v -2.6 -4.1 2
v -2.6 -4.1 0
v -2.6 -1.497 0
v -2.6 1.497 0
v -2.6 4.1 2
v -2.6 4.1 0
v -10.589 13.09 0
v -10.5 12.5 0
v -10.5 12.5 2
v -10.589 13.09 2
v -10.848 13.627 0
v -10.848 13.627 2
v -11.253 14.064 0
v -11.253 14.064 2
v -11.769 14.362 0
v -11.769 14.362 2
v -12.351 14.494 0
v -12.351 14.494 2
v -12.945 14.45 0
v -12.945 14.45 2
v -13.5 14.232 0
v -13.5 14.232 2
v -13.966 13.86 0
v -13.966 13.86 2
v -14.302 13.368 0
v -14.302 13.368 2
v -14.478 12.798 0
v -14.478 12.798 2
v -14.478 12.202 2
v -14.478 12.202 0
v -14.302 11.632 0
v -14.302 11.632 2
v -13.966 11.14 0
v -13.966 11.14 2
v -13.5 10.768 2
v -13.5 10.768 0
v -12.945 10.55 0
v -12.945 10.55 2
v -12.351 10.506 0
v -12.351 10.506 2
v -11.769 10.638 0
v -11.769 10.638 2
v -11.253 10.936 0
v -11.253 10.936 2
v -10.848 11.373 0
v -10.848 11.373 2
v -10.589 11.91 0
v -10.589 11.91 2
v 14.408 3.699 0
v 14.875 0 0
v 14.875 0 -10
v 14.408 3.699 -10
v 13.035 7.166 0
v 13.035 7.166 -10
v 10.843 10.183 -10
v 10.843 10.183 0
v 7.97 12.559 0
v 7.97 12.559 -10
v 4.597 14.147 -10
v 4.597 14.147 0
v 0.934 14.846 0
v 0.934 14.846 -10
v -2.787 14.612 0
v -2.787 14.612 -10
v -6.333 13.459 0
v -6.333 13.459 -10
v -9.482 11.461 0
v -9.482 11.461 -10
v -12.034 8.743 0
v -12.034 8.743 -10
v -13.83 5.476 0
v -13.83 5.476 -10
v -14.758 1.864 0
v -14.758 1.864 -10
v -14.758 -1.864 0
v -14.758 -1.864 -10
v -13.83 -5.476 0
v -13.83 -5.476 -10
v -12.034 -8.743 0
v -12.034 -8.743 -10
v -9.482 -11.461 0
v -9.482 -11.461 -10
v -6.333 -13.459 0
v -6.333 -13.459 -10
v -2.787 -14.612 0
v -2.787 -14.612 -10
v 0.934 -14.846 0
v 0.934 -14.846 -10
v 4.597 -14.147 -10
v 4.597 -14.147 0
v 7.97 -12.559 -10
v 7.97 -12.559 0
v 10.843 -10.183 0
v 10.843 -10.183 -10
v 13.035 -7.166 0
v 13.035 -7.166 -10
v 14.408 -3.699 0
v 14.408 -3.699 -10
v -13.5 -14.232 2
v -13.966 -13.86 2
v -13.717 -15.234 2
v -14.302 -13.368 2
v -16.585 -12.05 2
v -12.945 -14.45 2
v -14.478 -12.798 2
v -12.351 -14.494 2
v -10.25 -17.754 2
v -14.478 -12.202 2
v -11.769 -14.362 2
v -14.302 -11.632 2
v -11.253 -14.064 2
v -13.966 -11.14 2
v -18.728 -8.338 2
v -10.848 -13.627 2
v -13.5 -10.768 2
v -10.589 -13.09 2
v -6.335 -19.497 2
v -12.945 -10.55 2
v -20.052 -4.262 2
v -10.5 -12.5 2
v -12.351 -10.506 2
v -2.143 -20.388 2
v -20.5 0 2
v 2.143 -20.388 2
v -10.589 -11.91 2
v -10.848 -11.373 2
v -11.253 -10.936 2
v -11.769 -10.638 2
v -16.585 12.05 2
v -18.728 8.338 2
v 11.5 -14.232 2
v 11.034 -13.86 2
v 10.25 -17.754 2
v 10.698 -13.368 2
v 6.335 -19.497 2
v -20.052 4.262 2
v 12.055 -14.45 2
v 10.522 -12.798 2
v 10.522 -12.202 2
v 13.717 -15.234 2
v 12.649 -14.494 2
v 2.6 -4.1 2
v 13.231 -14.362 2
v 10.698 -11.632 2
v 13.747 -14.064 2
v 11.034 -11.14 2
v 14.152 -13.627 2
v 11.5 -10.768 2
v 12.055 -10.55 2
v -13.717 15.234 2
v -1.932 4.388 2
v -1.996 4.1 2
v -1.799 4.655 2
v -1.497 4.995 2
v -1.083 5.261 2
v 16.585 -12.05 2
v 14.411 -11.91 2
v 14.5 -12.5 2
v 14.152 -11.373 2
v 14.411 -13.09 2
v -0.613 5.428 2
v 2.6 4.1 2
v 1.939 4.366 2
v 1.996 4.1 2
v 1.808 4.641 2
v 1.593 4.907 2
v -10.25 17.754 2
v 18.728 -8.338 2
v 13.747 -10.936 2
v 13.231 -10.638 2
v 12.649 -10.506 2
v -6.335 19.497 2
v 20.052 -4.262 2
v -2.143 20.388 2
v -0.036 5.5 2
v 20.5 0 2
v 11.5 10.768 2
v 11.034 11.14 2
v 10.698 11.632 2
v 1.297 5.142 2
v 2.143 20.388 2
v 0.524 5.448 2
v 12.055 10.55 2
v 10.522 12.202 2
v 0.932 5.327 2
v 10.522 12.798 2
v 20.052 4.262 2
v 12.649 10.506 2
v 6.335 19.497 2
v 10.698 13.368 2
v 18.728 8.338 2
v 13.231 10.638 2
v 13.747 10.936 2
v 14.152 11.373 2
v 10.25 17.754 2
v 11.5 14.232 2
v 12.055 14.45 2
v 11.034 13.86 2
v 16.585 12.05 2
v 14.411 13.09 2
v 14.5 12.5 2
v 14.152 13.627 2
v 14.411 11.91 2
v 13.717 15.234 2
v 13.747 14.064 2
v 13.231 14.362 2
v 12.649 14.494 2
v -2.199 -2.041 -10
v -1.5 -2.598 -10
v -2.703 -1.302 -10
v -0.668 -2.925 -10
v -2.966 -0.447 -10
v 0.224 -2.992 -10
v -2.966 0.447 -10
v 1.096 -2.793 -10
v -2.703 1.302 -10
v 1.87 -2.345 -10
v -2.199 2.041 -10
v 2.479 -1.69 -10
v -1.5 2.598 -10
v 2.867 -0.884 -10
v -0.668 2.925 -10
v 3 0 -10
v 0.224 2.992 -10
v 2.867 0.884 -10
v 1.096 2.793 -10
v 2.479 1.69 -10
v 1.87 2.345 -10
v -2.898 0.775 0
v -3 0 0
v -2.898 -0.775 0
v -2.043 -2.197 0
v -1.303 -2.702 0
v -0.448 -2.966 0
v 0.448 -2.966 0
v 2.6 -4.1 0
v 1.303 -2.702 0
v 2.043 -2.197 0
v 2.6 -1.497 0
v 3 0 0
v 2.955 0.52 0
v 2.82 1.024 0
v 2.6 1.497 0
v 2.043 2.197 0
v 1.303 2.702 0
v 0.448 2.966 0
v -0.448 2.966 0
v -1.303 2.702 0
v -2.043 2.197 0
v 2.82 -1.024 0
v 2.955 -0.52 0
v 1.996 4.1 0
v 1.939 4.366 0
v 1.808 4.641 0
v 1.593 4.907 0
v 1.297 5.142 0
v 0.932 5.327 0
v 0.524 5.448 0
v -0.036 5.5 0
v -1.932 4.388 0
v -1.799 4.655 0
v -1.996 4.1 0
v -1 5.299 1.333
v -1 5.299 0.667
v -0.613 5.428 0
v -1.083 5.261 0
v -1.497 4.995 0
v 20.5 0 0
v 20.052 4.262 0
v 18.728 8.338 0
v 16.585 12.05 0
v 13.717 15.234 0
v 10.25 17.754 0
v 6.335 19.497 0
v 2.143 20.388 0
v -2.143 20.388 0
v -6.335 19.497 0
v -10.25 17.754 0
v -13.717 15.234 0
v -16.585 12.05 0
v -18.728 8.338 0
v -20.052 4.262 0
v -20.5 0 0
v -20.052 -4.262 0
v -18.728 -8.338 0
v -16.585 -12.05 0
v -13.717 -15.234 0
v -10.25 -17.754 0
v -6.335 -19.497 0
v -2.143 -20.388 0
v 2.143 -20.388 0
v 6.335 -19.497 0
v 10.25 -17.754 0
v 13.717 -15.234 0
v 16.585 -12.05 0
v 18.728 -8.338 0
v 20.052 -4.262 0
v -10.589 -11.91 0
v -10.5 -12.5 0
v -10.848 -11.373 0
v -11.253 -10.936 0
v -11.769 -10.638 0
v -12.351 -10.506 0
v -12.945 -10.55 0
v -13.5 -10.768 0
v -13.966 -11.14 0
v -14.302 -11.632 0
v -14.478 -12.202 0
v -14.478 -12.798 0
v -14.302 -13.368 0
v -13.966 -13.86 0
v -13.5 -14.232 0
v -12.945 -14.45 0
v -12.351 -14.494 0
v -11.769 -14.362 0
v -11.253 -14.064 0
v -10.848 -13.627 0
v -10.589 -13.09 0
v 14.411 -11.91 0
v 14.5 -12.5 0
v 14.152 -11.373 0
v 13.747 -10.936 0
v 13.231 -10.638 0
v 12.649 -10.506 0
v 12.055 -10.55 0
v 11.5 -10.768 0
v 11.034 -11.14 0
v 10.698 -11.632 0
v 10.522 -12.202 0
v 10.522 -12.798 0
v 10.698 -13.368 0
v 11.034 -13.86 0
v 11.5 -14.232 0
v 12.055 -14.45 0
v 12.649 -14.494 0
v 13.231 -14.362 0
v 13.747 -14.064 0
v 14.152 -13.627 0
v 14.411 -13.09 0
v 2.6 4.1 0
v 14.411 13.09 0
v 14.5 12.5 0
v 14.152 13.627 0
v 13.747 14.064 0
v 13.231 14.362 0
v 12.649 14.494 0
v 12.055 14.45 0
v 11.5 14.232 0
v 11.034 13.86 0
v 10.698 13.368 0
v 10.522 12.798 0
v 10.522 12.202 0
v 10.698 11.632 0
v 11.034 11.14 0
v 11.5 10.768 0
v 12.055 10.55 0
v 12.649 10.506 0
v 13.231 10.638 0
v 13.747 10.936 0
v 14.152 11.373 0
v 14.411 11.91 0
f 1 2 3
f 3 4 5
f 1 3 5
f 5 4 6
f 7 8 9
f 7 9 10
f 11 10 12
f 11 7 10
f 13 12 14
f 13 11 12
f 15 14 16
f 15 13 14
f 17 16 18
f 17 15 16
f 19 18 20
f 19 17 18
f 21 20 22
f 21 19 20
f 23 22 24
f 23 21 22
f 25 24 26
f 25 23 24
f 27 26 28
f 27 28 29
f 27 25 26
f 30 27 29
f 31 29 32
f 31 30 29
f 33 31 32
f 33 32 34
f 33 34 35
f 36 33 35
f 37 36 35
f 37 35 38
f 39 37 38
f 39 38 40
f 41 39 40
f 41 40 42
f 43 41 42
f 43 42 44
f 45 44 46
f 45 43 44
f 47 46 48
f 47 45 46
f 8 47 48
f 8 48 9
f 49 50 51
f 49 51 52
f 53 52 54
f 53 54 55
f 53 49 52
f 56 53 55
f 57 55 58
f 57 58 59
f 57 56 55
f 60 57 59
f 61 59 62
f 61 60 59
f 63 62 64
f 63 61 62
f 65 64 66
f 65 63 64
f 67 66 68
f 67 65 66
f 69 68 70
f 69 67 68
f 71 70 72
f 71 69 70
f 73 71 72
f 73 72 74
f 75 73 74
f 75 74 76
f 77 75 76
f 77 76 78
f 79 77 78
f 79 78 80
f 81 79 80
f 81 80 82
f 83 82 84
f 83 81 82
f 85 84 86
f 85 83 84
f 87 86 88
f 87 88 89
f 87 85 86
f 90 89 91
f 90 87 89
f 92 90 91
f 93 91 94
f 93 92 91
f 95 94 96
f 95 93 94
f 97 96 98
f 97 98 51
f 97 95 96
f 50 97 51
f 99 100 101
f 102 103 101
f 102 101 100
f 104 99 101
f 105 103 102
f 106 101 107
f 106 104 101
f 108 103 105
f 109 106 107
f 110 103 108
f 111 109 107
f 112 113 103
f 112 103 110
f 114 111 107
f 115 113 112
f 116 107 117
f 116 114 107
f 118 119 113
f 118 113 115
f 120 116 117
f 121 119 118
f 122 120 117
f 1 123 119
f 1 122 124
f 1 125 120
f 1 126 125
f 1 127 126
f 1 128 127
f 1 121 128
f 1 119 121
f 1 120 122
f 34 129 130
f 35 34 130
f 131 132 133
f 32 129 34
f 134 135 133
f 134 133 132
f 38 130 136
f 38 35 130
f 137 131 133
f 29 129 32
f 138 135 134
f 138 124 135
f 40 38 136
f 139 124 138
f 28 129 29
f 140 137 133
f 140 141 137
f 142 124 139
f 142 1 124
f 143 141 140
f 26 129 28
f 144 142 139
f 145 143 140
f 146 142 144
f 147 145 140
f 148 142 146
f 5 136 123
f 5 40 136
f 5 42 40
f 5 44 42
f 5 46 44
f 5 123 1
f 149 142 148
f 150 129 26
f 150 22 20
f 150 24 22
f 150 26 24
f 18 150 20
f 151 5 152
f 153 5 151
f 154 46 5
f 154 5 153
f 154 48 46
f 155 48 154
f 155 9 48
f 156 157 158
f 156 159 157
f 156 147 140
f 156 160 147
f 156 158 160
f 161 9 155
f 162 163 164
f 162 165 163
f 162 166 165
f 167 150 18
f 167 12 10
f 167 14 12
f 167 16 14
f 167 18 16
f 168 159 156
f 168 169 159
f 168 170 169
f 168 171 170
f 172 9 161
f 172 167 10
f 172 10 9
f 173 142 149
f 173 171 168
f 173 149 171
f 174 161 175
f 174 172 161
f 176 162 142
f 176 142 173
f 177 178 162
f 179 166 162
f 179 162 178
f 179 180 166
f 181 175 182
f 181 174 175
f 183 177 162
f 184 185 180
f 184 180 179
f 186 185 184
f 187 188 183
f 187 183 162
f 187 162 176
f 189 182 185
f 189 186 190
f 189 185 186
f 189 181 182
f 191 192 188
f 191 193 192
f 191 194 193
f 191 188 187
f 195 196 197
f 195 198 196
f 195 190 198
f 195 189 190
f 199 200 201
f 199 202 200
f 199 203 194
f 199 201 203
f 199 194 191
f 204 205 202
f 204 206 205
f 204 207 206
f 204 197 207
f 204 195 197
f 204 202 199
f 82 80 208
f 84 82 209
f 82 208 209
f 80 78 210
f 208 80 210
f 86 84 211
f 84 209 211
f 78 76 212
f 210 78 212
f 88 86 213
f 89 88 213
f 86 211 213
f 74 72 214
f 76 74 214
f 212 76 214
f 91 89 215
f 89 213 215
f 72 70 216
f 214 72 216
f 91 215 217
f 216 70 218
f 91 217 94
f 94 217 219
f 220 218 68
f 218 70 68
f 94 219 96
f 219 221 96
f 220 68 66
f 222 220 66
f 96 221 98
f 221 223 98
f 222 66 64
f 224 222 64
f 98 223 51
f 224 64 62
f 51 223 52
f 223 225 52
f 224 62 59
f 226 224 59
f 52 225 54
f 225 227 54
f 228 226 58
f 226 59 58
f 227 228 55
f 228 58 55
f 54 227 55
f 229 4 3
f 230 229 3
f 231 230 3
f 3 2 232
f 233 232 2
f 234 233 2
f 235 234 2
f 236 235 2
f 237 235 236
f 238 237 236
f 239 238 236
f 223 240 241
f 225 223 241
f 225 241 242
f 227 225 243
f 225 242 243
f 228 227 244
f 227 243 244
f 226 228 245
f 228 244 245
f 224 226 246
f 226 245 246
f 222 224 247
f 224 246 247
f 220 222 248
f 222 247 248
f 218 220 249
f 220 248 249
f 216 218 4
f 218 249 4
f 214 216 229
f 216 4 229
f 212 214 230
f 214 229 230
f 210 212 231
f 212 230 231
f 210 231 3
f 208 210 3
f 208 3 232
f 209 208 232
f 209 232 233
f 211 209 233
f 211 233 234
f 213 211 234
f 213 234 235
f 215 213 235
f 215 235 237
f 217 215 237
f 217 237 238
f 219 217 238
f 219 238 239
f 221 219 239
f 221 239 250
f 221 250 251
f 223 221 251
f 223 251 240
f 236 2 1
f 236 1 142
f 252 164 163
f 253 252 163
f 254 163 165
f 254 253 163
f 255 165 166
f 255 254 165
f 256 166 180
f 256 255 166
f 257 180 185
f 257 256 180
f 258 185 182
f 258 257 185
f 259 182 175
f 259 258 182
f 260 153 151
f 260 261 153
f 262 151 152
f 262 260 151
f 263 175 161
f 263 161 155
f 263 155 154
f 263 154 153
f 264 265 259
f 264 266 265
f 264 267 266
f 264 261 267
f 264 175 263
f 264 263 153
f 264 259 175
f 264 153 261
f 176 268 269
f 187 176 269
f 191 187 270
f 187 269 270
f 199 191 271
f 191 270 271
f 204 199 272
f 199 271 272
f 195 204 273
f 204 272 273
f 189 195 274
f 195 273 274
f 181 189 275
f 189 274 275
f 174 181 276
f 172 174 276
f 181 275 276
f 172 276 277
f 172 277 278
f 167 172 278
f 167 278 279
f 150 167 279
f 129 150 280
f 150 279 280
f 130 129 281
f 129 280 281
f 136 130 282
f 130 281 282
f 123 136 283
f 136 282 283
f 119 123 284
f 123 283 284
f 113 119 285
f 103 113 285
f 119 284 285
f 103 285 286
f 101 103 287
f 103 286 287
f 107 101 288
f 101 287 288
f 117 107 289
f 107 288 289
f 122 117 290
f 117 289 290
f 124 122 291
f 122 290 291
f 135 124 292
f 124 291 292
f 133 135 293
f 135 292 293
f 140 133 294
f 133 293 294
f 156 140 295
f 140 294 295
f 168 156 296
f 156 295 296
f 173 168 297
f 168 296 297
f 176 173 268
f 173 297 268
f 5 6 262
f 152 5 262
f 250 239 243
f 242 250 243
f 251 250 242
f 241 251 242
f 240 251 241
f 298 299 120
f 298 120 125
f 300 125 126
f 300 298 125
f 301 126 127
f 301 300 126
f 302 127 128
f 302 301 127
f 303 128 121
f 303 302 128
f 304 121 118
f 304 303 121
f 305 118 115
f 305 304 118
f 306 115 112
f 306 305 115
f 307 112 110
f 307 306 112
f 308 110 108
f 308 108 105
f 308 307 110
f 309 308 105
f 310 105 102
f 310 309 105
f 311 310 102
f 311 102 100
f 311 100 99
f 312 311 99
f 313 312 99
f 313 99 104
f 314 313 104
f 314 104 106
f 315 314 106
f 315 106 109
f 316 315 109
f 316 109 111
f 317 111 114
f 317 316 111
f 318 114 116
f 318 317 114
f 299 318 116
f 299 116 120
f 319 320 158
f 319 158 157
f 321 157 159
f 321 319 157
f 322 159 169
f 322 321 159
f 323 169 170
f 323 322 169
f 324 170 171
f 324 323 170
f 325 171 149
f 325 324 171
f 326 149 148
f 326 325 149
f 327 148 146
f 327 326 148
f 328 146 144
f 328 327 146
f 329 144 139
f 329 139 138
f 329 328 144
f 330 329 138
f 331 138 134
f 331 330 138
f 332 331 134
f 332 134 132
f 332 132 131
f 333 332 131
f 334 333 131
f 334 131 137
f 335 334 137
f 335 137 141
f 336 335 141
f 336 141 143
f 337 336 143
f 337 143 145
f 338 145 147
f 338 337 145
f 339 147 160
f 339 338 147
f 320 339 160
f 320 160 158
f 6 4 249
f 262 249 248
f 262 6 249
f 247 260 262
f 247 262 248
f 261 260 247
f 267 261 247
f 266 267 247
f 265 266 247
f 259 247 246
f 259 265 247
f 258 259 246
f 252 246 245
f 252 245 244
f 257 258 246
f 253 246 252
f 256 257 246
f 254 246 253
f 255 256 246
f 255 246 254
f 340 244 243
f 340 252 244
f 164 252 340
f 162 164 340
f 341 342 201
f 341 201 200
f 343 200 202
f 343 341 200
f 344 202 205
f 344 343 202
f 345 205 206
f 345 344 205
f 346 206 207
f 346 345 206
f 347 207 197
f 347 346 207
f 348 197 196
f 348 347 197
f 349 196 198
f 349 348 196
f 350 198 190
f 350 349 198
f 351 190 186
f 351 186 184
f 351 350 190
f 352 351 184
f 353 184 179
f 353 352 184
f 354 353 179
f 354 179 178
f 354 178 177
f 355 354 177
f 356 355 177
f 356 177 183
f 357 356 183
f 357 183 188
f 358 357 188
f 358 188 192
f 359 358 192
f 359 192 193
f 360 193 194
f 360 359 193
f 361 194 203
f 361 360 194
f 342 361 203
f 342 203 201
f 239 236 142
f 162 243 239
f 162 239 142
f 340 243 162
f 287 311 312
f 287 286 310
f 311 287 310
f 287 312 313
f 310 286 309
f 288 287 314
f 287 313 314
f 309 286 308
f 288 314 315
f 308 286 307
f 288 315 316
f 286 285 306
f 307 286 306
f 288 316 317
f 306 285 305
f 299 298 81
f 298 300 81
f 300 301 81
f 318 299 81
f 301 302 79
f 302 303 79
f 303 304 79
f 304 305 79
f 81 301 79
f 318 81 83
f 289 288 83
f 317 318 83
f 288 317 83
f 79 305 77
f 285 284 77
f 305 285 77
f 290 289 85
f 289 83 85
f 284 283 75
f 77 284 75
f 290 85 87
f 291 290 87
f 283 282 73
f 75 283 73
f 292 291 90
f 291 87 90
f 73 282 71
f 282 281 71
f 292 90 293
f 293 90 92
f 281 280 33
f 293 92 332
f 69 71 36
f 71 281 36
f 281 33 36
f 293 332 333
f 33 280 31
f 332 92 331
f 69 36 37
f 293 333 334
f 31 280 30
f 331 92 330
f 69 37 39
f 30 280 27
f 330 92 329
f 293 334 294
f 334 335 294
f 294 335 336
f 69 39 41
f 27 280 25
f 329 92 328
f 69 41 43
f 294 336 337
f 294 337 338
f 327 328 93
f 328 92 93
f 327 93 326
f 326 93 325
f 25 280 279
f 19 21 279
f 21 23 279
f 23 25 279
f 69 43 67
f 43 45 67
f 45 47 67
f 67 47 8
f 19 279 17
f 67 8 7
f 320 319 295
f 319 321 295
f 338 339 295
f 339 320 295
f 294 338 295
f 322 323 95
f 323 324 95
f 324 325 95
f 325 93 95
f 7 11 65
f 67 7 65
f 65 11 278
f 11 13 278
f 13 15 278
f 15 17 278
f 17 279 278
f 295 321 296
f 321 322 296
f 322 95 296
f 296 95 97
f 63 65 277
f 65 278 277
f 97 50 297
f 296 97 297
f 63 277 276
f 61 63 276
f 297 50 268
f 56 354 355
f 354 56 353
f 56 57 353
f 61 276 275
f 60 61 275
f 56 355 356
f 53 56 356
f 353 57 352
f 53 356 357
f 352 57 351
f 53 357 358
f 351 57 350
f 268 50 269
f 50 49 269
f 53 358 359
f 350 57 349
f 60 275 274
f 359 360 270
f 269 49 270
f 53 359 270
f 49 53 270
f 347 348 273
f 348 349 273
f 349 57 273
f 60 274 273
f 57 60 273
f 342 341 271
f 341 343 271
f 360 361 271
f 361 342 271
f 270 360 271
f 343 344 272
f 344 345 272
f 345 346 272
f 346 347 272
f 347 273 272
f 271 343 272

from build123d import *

# Parameters (mm, degrees)
F0_R      = 20.5
F1_DEPTH  = 2
F2_R      = 14.875
F3_DEPTH  = 10
F4_R      = 2
F5_DEPTH  = 2
F6_R      = 3
F7_DEPTH  = 10
F8_W      = 5.2
F8_H      = 8.2
F9_DEPTH  = 2
F11_DEPTH = 2


with BuildPart() as f1:
    # F0 (on Top) → F1 (new body)
    with BuildSketch(Plane.XY):
        Circle(F0_R)
    extrude(amount=F1_DEPTH)

    # F2 (on Top) → F3 (join)
    with BuildSketch(Plane.XY):
        Circle(F2_R)
    extrude(amount=-F3_DEPTH)

    # F4 (on Top) → F5 (cut)
    with BuildSketch(Plane.XY):
        with Locations((-12.5, 12.5)):
            Circle(F4_R)
        with Locations((12.5, 12.5)):
            Circle(F4_R)
        with Locations((12.5, -12.5)):
            Circle(F4_R)
        with Locations((-12.5, -12.5)):
            Circle(F4_R)
    extrude(amount=F5_DEPTH, mode=Mode.SUBTRACT)

    # F6 (on Top) → F7 (cut)
    with BuildSketch(Plane.XY):
        Circle(F6_R)
    extrude(amount=-F7_DEPTH, mode=Mode.SUBTRACT)

    # F8 (on Top) → F9 (cut)
    with BuildSketch(Plane.XY):
        Rectangle(F8_W, F8_H)
    extrude(amount=F9_DEPTH, mode=Mode.SUBTRACT)

    # F10 (on Top) → F11 (cut)
    with BuildSketch(Plane.XY):
        with BuildLine():
            add(Edge.make_bspline(
                [(2, 4), (2, 6.598076), (-1, 5.299038), (-4, 4), (-1, 2.700962), (2, 1.401924), (2, 4)],
                knots=[0, 0, 0, 2.094395, 2.094395, 4.18879, 4.18879, 6.283185, 6.283185, 6.283185], degree=2, weights=[1, 0.5, 1, 0.5, 1, 0.5, 1]))
        make_face()
    extrude(amount=F11_DEPTH, mode=Mode.SUBTRACT)


solid = f1.part
